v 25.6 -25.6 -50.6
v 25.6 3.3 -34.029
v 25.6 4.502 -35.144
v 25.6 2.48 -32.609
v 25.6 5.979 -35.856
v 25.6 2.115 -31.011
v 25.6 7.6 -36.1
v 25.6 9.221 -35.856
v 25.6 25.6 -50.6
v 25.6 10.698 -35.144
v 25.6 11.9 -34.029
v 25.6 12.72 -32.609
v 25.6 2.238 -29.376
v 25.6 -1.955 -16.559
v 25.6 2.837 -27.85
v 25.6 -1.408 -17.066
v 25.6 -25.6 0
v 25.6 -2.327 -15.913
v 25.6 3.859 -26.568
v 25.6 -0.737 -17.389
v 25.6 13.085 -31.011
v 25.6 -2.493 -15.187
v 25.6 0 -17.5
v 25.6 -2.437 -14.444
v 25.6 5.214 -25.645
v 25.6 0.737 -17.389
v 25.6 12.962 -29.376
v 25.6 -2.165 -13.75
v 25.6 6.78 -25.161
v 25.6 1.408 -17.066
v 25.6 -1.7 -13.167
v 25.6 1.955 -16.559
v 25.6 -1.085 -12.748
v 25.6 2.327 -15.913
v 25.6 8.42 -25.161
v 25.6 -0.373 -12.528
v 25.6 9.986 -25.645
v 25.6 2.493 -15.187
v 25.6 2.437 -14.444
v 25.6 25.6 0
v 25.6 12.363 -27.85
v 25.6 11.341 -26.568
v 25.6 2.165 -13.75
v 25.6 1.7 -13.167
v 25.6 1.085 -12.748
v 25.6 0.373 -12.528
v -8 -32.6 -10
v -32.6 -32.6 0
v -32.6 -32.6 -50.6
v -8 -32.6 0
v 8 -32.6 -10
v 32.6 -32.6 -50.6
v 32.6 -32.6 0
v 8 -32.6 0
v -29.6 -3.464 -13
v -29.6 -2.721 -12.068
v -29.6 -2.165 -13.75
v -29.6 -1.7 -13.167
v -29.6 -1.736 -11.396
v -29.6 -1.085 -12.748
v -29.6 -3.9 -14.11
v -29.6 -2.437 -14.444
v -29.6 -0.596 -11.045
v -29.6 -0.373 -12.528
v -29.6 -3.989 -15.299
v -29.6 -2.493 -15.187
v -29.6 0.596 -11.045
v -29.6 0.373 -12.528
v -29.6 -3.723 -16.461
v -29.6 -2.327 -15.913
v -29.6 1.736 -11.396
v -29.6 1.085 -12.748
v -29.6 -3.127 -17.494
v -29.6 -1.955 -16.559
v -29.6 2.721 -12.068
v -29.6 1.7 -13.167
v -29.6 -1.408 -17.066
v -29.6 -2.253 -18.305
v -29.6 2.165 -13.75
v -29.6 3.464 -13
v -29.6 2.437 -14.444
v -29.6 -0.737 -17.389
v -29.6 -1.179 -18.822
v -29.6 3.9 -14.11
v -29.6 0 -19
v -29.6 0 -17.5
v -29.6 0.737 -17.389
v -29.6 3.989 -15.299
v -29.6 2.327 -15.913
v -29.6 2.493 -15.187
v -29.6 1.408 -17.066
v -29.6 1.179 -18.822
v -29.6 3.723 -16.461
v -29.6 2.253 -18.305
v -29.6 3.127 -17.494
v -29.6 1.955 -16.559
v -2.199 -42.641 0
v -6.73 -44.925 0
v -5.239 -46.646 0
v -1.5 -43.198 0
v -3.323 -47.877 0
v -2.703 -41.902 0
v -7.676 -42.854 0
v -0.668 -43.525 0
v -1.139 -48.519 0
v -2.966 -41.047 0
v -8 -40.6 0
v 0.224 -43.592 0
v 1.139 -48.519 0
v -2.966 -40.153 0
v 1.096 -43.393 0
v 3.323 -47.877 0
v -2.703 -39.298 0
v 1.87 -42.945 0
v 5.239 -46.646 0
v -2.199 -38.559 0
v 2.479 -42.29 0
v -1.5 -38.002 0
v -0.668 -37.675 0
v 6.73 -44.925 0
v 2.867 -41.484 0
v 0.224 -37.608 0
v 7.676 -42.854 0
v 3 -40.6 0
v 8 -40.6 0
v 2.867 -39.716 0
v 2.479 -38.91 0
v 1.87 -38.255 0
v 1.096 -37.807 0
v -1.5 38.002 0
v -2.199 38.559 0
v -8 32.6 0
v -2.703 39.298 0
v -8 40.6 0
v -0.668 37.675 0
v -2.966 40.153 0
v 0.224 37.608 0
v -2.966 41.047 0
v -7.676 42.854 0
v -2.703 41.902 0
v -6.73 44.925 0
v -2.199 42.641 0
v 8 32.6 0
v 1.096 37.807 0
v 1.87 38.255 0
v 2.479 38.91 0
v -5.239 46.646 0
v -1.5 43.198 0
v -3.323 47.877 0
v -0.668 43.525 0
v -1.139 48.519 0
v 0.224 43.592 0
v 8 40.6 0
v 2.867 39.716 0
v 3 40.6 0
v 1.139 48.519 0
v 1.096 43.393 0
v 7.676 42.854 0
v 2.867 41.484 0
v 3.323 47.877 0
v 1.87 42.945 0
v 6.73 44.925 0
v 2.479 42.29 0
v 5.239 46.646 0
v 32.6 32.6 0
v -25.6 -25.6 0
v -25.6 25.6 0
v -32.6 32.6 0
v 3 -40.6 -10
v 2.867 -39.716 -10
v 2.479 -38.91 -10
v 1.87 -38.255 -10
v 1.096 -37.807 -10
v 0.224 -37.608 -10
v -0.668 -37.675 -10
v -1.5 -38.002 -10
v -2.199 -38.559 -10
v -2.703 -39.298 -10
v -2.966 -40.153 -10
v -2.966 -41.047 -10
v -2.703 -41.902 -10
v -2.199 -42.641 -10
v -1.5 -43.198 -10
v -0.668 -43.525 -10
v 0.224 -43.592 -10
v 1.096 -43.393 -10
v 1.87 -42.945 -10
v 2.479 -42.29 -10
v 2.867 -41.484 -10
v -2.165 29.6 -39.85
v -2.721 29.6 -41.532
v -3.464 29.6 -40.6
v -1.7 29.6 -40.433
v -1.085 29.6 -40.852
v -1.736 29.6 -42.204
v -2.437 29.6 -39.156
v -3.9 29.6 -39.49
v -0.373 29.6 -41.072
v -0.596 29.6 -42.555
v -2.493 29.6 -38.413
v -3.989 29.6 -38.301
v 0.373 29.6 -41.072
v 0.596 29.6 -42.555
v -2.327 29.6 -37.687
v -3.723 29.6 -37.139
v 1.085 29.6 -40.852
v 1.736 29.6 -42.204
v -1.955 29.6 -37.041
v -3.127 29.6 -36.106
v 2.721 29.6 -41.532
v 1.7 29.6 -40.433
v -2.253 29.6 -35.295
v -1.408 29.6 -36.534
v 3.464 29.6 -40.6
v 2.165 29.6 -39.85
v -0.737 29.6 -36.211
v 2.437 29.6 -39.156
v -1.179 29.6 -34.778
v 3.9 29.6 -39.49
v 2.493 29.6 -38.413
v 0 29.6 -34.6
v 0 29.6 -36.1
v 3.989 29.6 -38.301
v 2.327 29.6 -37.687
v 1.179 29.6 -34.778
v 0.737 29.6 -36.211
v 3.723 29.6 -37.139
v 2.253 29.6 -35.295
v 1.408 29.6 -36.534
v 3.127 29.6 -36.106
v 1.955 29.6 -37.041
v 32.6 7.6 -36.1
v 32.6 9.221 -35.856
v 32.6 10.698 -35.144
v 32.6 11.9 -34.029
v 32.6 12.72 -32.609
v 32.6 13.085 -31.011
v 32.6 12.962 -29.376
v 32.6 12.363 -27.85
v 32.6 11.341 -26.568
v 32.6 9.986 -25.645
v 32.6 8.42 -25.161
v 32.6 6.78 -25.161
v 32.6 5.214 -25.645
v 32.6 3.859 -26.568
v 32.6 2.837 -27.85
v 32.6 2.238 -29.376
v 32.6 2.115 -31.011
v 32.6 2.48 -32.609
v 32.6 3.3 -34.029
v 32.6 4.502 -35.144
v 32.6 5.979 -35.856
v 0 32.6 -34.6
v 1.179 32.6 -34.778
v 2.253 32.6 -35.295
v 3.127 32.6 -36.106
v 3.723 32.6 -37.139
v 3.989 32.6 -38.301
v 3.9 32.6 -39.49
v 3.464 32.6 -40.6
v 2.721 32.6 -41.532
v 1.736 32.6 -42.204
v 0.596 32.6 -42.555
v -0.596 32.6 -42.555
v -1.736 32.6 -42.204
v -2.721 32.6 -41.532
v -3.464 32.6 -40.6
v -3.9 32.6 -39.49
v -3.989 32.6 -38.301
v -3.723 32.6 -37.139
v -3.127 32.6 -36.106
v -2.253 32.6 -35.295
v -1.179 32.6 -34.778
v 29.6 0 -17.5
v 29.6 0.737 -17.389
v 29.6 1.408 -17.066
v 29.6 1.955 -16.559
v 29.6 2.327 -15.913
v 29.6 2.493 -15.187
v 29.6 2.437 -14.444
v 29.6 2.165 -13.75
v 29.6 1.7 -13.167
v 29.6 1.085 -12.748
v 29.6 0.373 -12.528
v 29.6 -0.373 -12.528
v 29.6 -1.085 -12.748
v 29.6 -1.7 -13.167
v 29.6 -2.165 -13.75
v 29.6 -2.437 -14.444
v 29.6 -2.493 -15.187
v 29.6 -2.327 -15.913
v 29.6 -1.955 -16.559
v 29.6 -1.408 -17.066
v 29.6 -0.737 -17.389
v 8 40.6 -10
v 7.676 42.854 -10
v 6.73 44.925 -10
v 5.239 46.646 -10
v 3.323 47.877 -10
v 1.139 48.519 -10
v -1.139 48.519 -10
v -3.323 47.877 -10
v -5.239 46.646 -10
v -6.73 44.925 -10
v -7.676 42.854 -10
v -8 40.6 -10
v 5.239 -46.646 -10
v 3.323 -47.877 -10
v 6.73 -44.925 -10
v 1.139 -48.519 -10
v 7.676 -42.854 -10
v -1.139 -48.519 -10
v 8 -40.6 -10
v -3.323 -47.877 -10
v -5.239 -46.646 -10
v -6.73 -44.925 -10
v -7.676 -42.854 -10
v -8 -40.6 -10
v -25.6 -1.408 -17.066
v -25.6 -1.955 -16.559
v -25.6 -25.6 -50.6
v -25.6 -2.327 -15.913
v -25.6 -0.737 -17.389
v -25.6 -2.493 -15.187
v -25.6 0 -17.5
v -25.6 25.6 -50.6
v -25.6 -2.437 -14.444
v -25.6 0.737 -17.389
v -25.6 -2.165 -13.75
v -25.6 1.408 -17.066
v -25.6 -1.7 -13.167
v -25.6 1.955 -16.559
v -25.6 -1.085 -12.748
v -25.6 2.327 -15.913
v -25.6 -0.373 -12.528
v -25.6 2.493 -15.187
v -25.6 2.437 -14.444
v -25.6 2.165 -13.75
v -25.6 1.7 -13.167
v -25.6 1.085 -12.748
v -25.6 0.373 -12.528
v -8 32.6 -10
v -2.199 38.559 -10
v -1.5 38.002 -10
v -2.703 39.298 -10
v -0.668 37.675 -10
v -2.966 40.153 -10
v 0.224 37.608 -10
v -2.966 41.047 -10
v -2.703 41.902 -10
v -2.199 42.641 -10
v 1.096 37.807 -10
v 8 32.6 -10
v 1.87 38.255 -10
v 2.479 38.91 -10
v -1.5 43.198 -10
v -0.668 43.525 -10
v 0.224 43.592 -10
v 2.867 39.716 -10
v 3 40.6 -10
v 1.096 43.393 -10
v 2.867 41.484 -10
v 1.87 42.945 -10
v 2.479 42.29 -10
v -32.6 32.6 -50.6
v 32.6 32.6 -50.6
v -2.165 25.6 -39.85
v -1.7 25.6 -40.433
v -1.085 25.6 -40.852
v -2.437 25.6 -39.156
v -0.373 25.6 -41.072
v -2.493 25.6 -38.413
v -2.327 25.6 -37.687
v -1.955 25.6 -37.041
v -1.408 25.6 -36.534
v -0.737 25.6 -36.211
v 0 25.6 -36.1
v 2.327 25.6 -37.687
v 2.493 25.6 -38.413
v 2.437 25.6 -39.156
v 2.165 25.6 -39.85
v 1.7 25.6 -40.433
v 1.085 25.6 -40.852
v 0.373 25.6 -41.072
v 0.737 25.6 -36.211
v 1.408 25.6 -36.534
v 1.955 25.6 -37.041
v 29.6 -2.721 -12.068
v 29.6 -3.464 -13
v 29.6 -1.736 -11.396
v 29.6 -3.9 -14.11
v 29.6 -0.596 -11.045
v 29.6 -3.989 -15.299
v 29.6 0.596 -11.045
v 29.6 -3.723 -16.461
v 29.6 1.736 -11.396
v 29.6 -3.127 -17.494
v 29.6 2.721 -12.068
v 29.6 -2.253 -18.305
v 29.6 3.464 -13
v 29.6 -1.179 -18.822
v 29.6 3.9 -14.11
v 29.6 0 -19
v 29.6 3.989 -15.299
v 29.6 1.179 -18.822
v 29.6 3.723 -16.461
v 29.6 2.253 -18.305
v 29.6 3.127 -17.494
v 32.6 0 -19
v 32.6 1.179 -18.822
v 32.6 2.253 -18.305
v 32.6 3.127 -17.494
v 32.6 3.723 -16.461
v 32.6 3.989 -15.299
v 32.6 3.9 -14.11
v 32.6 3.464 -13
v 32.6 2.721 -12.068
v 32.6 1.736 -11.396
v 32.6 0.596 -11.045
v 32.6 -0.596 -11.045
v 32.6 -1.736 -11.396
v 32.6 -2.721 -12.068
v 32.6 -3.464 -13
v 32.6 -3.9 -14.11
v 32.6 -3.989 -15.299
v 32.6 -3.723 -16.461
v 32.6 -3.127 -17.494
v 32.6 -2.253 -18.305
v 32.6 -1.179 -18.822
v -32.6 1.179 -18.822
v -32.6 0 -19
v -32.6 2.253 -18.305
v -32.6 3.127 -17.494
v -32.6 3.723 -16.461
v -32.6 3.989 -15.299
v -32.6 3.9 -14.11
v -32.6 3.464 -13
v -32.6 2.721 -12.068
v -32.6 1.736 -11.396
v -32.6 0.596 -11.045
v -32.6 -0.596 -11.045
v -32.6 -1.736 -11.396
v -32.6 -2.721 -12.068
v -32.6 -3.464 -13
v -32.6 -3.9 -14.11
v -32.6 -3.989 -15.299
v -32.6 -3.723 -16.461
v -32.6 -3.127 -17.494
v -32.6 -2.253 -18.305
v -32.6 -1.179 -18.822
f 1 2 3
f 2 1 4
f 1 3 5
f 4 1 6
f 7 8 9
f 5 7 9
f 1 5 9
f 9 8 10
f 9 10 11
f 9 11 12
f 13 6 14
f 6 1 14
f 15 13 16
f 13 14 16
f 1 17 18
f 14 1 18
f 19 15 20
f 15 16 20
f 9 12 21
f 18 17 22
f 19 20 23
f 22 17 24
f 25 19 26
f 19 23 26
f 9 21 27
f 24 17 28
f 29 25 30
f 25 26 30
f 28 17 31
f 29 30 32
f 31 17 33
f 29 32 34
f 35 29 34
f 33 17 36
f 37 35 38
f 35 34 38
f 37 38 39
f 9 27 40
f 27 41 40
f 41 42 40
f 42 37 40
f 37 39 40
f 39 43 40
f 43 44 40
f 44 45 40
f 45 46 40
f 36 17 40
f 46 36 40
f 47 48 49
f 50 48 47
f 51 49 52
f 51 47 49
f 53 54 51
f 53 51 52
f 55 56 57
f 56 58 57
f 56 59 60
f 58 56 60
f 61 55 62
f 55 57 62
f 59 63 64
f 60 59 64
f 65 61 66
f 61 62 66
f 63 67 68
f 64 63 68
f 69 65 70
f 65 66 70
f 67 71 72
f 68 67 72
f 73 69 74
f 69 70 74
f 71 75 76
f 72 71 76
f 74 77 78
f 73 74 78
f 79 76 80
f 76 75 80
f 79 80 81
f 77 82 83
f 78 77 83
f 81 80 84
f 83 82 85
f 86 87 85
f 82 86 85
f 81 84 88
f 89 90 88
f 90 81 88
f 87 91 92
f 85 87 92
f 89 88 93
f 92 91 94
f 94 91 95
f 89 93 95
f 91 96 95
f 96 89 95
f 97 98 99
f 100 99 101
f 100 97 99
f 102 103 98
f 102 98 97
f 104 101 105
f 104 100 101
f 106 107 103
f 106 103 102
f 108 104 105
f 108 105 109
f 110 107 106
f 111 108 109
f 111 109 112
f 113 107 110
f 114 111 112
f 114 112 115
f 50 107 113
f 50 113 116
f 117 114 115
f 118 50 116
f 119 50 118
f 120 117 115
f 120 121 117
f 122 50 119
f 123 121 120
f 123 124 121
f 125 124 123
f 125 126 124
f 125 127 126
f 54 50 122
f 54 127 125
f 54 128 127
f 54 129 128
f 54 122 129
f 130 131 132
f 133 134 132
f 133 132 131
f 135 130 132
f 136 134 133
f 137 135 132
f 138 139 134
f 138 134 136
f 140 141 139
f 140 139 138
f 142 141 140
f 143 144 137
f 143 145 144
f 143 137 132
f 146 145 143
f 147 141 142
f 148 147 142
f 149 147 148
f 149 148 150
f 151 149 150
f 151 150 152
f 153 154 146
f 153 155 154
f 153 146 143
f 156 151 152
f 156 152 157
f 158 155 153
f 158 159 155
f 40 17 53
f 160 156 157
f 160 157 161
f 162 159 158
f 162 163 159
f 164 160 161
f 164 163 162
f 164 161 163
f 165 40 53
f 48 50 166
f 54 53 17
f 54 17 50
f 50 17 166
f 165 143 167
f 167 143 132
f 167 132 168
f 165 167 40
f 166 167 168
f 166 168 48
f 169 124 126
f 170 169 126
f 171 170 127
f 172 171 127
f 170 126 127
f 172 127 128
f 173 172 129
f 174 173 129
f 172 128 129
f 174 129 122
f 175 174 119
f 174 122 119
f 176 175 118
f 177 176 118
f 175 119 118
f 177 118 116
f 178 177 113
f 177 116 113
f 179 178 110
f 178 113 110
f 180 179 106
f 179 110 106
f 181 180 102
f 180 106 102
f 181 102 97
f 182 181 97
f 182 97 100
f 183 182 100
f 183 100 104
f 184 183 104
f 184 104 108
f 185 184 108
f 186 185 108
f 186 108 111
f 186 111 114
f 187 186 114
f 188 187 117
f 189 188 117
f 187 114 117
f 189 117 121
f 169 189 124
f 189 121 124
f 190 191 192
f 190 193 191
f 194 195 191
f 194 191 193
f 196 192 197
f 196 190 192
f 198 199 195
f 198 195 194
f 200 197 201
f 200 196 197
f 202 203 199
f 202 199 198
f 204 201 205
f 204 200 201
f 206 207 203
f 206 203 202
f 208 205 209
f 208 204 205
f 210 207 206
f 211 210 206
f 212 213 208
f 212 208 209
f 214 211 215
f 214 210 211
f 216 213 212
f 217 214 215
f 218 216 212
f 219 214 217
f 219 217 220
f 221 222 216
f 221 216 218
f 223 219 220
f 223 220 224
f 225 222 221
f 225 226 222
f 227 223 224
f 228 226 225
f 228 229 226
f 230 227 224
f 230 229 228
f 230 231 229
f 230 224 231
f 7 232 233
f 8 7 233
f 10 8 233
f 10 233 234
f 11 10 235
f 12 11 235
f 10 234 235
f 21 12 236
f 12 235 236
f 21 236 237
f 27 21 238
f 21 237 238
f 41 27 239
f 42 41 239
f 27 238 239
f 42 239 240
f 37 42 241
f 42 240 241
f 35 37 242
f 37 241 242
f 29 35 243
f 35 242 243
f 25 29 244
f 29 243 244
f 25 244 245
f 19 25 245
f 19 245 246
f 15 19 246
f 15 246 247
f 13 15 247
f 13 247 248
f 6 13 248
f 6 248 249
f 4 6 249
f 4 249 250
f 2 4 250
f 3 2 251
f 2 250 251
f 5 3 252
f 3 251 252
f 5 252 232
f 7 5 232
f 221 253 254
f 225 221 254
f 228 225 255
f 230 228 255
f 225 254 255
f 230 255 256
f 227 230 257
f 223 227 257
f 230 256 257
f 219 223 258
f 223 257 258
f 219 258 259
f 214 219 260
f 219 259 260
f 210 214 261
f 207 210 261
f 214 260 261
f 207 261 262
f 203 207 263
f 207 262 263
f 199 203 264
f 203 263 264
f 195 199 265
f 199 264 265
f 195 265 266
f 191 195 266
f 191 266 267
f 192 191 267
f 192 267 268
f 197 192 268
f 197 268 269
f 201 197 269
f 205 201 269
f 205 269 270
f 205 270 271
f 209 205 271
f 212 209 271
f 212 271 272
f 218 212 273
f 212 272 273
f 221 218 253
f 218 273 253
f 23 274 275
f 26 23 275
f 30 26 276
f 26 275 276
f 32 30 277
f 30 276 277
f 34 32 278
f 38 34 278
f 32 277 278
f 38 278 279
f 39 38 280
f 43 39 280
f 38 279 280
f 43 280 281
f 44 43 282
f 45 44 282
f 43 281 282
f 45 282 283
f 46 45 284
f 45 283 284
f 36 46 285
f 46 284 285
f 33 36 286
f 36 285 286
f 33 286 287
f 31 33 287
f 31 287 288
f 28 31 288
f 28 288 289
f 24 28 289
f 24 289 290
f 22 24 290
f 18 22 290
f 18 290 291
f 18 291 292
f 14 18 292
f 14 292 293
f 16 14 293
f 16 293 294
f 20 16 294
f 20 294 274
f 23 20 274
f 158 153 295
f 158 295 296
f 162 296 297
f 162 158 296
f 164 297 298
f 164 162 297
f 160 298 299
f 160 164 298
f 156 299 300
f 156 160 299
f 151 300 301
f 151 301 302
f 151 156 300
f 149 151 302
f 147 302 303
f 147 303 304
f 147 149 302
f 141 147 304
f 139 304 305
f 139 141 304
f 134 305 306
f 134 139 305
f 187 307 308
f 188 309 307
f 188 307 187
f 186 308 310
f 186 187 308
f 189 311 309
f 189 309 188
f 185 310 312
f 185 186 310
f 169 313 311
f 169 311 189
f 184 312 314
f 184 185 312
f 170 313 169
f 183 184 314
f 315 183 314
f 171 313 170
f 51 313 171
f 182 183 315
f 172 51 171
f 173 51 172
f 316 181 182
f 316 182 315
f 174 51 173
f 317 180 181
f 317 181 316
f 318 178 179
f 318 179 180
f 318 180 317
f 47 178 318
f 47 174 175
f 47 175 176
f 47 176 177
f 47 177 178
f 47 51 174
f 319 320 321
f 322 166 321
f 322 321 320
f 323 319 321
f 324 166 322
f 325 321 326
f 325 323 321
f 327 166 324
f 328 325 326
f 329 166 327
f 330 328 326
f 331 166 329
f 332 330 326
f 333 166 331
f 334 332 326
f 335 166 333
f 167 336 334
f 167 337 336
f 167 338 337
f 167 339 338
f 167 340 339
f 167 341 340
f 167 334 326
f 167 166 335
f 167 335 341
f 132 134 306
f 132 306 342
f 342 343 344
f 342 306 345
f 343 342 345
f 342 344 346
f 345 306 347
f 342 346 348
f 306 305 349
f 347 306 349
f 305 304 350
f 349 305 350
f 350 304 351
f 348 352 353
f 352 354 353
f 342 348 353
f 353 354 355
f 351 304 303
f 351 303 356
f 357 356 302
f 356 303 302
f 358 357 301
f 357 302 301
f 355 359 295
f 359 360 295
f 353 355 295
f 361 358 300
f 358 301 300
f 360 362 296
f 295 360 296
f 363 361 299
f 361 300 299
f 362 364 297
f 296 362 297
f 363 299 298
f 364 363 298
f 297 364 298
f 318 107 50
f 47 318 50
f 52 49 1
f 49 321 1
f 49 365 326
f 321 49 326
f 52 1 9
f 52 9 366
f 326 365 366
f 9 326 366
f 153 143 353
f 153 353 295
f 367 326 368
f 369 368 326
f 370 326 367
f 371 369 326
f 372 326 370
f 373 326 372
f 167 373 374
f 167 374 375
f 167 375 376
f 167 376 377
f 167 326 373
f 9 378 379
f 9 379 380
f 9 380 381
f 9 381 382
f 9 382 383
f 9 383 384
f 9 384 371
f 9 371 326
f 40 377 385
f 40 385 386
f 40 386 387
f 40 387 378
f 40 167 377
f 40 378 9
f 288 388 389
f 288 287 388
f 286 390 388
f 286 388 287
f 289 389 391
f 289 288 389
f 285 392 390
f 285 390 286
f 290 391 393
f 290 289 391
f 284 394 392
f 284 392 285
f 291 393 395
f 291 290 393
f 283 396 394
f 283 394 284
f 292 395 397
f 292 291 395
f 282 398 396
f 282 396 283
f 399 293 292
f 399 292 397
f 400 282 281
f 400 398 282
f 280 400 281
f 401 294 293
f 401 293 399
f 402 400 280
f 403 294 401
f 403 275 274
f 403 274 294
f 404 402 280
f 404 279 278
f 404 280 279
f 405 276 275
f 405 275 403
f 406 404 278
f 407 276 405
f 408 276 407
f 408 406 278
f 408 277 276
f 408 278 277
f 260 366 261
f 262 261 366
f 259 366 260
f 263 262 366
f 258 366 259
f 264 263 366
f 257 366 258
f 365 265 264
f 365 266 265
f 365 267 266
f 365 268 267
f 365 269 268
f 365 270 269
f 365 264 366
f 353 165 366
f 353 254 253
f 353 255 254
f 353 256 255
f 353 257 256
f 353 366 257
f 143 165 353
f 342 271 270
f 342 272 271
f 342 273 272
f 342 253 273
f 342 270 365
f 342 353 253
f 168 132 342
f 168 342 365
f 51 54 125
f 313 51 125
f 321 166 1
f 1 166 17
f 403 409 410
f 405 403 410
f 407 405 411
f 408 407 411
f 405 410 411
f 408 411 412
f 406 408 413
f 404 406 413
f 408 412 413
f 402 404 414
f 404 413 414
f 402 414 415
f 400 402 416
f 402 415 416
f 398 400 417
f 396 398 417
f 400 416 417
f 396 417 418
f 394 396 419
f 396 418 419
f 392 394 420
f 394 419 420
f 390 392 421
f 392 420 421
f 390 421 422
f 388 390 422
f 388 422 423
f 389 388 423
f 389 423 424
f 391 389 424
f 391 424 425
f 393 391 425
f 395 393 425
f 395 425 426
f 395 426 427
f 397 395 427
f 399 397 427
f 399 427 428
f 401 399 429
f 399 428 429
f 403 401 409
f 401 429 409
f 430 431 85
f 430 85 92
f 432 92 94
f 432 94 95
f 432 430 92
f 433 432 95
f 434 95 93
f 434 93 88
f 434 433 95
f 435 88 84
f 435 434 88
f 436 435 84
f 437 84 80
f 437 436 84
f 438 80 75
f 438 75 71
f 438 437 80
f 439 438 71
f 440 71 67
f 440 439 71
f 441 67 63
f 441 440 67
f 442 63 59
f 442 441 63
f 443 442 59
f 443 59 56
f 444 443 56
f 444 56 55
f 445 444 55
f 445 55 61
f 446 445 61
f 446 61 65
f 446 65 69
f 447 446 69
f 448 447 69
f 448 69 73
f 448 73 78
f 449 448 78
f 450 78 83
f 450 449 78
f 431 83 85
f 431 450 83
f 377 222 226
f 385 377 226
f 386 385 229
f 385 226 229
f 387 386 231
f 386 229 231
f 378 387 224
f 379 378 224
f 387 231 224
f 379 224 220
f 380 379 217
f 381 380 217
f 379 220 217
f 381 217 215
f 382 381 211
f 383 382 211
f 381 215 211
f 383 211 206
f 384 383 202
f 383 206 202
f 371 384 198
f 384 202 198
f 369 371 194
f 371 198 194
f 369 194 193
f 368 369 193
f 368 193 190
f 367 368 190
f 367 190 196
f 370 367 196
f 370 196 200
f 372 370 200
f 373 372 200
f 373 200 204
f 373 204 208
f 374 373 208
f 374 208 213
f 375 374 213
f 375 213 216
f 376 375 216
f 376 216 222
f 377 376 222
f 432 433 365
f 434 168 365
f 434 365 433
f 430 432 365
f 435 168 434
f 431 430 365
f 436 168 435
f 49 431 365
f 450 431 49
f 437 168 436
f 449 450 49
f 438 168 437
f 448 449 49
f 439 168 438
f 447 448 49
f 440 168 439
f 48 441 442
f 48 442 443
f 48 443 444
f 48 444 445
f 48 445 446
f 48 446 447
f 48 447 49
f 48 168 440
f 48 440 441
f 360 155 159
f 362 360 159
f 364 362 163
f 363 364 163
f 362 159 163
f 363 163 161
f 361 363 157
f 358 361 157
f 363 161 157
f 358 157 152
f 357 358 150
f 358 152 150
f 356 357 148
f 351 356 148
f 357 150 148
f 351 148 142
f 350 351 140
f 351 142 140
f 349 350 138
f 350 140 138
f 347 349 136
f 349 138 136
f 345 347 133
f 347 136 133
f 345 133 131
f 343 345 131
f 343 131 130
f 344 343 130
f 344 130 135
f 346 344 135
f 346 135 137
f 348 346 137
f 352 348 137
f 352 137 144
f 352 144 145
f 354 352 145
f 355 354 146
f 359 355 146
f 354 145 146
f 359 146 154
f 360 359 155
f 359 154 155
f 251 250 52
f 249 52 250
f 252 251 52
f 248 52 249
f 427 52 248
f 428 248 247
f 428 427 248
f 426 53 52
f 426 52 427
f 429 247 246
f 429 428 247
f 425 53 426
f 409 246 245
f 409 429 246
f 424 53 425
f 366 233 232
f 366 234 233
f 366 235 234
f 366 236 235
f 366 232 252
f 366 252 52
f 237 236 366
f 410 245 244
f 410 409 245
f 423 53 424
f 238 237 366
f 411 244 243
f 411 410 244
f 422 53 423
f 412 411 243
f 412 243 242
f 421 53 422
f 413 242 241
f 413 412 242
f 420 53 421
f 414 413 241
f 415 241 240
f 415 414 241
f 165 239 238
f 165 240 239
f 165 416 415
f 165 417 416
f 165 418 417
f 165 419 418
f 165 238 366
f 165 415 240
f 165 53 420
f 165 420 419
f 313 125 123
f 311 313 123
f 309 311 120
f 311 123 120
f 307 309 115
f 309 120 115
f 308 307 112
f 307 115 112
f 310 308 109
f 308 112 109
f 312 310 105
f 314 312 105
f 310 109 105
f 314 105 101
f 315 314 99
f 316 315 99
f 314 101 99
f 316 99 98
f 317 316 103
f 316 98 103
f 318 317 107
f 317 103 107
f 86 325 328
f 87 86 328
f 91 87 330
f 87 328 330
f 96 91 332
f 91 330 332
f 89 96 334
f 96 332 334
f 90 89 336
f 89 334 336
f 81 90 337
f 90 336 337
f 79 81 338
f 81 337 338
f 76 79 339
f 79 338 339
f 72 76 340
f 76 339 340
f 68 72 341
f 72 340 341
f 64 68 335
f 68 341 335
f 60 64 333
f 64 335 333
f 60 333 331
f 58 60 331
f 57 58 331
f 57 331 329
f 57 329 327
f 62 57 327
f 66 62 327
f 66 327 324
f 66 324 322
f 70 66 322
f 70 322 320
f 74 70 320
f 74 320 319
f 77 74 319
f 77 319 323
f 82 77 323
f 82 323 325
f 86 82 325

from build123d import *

# Parameters (mm, degrees)
ESBO_O1_W                = 51.2
ESBO_O1_H                = 51.2
RESSALTO_EXTRUS_O1_DEPTH = 50.6
ESBO_O1_3_R              = 3
RESSALTO_EXTRUS_O2_DEPTH = 10
ESBO_O3_R                = 5.5
CORTE_EXTRUS_O2_DEPTH    = 7
ESBO_O4_R                = 2.5
CORTE_EXTRUS_O3_DEPTH    = 96.77765919
ESBO_O5_R                = 4
CORTE_EXTRUS_O4_DEPTH    = 3
ESBO_O6_R                = 2.5
CORTE_EXTRUS_O5_DEPTH    = 7
ESBO_O7_R                = 4
CORTE_EXTRUS_O6_DEPTH    = 3


with BuildPart() as part:
    # Esboço1 → Ressalto-extrusão1 (new body)
    with BuildSketch(Plane.XY):
        Polygon((-8, 32.6), (-32.6, 32.6), (-32.6, -32.6), (-8, -32.6), (8, -32.6), (32.6, -32.6), (32.6, 32.6), (8, 32.6), align=None)
        Rectangle(ESBO_O1_W, ESBO_O1_H, mode=Mode.SUBTRACT)
    extrude(amount=-RESSALTO_EXTRUS_O1_DEPTH)

    # Esboço1<3> → Ressalto-extrusão2 (add)
    # profile 1 of 2: a face of its own
    with BuildSketch(Plane.XY):
        with BuildLine():
            Line((8, 32.6), (8, 40.6))
            ThreePointArc((8, 40.6), (0, 48.6), (-8, 40.6))
            Line((-8, 40.6), (-8, 32.6))
            Line((-8, 32.6), (8, 32.6))
        make_face()
        with Locations((0, 40.6)):
            Circle(ESBO_O1_3_R, mode=Mode.SUBTRACT)
    # profile 2 of 2: a face of its own
    with BuildSketch(Plane.XY):
        with BuildLine():
            ThreePointArc((8, -40.6), (0, -48.6), (-8, -40.6))
            Line((-8, -40.6), (-8, -32.6))
            Line((-8, -32.6), (8, -32.6))
            Line((8, -32.6), (8, -40.6))
        make_face()
        with Locations((0, -40.6)):
            Circle(ESBO_O1_3_R, mode=Mode.SUBTRACT)
    extrude(amount=-RESSALTO_EXTRUS_O2_DEPTH)

    # Esboço3 → Corte-extrusão2 (cut)
    with BuildSketch(Plane(origin=(32.6, 0, 0), x_dir=(0, 0, -1), z_dir=(1, 0, 0))):
        with Locations((30.6, 7.6)):
            Circle(ESBO_O3_R)
    extrude(amount=-CORTE_EXTRUS_O2_DEPTH, mode=Mode.SUBTRACT)

    # Esboço4 → Corte-extrusão3 (cut, through all)
    with BuildSketch(Plane(origin=(32.6, 0, 0), x_dir=(0, 0, -1), z_dir=(1, 0, 0))):
        with Locations((15, 0)):
            Circle(ESBO_O4_R)
    extrude(amount=-CORTE_EXTRUS_O3_DEPTH, mode=Mode.SUBTRACT)

    # Esboço5 → Corte-extrusão4 (cut)
    with BuildSketch(Plane(origin=(32.6, 0, 0), x_dir=(0, 0, -1), z_dir=(1, 0, 0))):
        with Locations((15, 0)):
            Circle(ESBO_O5_R)
    corte_extrus_o4 = extrude(amount=-CORTE_EXTRUS_O4_DEPTH, mode=Mode.SUBTRACT)

    # Espelhar1: Corte-extrusão4 across plane
    add(corte_extrus_o4.mirror(Plane(origin=(0, 0, 0), x_dir=(0, 0, 1), z_dir=(1, 0, 0))), mode=Mode.SUBTRACT)

    # Esboço6 → Corte-extrusão5 (cut)
    with BuildSketch(Plane(origin=(0, 32.6, 0), x_dir=(1, 0, 0), z_dir=(0, 1, 0))):
        with Locations(Location((0, 38.6, 0), (0, 0, 270))):
            Circle(ESBO_O6_R)
    extrude(amount=-CORTE_EXTRUS_O5_DEPTH, mode=Mode.SUBTRACT)

    # Esboço7 → Corte-extrusão6 (cut)
    with BuildSketch(Plane(origin=(0, 32.6, 0), x_dir=(1, 0, 0), z_dir=(0, 1, 0))):
        with Locations(Location((0, 38.6, 0), (0, 0, 270))):
            Circle(ESBO_O7_R)
    extrude(amount=-CORTE_EXTRUS_O6_DEPTH, mode=Mode.SUBTRACT)


solid = part.part
